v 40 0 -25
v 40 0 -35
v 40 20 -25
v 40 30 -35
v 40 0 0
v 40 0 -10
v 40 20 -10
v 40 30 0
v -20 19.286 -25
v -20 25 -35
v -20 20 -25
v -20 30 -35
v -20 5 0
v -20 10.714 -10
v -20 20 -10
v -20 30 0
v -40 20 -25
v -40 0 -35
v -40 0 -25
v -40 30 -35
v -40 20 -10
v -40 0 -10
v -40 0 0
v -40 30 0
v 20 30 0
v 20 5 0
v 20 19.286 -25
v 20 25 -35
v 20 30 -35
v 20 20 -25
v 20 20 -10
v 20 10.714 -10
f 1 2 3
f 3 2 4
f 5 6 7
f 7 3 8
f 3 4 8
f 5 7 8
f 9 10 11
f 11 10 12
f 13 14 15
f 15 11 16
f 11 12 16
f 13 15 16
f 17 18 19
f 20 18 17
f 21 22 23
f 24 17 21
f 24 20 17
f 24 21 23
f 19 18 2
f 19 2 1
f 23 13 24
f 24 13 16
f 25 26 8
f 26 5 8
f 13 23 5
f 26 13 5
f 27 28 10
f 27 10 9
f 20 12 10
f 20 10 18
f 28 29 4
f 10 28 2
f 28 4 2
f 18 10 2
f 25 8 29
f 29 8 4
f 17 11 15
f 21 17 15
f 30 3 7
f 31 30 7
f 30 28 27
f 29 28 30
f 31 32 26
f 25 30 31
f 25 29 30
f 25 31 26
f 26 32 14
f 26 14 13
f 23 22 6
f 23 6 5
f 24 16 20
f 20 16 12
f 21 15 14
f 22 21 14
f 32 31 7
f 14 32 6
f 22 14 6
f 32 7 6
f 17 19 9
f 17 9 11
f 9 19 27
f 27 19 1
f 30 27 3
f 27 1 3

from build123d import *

# Parameters (mm, degrees)
BOSS_EXTRUDE1_DEPTH = 40
CUT_EXTRUDE2_DEPTH  = 20


with BuildPart() as part:
    # Sketch1 → Boss-Extrude1 (new body, symmetric)
    with BuildSketch(Plane(origin=(0, 0, 0), x_dir=(0, 0, -1), z_dir=(1, 0, 0))):
        Polygon((0, 0), (0, 30), (35, 30), (35, 0), (25, 0), (25, 20), (10, 20), (10, 0), align=None)
    extrude(amount=BOSS_EXTRUDE1_DEPTH, both=True)

    # Sketch2 → Cut-Extrude2 (cut, symmetric)
    with BuildSketch(Plane(origin=(0, 0, 0), x_dir=(0, 0, -1), z_dir=(1, 0, 0))):
        Polygon((35, 25), (0, 5), (0, 30), (35, 30), align=None)
    extrude(amount=CUT_EXTRUDE2_DEPTH, both=True, mode=Mode.SUBTRACT)


solid = part.part
